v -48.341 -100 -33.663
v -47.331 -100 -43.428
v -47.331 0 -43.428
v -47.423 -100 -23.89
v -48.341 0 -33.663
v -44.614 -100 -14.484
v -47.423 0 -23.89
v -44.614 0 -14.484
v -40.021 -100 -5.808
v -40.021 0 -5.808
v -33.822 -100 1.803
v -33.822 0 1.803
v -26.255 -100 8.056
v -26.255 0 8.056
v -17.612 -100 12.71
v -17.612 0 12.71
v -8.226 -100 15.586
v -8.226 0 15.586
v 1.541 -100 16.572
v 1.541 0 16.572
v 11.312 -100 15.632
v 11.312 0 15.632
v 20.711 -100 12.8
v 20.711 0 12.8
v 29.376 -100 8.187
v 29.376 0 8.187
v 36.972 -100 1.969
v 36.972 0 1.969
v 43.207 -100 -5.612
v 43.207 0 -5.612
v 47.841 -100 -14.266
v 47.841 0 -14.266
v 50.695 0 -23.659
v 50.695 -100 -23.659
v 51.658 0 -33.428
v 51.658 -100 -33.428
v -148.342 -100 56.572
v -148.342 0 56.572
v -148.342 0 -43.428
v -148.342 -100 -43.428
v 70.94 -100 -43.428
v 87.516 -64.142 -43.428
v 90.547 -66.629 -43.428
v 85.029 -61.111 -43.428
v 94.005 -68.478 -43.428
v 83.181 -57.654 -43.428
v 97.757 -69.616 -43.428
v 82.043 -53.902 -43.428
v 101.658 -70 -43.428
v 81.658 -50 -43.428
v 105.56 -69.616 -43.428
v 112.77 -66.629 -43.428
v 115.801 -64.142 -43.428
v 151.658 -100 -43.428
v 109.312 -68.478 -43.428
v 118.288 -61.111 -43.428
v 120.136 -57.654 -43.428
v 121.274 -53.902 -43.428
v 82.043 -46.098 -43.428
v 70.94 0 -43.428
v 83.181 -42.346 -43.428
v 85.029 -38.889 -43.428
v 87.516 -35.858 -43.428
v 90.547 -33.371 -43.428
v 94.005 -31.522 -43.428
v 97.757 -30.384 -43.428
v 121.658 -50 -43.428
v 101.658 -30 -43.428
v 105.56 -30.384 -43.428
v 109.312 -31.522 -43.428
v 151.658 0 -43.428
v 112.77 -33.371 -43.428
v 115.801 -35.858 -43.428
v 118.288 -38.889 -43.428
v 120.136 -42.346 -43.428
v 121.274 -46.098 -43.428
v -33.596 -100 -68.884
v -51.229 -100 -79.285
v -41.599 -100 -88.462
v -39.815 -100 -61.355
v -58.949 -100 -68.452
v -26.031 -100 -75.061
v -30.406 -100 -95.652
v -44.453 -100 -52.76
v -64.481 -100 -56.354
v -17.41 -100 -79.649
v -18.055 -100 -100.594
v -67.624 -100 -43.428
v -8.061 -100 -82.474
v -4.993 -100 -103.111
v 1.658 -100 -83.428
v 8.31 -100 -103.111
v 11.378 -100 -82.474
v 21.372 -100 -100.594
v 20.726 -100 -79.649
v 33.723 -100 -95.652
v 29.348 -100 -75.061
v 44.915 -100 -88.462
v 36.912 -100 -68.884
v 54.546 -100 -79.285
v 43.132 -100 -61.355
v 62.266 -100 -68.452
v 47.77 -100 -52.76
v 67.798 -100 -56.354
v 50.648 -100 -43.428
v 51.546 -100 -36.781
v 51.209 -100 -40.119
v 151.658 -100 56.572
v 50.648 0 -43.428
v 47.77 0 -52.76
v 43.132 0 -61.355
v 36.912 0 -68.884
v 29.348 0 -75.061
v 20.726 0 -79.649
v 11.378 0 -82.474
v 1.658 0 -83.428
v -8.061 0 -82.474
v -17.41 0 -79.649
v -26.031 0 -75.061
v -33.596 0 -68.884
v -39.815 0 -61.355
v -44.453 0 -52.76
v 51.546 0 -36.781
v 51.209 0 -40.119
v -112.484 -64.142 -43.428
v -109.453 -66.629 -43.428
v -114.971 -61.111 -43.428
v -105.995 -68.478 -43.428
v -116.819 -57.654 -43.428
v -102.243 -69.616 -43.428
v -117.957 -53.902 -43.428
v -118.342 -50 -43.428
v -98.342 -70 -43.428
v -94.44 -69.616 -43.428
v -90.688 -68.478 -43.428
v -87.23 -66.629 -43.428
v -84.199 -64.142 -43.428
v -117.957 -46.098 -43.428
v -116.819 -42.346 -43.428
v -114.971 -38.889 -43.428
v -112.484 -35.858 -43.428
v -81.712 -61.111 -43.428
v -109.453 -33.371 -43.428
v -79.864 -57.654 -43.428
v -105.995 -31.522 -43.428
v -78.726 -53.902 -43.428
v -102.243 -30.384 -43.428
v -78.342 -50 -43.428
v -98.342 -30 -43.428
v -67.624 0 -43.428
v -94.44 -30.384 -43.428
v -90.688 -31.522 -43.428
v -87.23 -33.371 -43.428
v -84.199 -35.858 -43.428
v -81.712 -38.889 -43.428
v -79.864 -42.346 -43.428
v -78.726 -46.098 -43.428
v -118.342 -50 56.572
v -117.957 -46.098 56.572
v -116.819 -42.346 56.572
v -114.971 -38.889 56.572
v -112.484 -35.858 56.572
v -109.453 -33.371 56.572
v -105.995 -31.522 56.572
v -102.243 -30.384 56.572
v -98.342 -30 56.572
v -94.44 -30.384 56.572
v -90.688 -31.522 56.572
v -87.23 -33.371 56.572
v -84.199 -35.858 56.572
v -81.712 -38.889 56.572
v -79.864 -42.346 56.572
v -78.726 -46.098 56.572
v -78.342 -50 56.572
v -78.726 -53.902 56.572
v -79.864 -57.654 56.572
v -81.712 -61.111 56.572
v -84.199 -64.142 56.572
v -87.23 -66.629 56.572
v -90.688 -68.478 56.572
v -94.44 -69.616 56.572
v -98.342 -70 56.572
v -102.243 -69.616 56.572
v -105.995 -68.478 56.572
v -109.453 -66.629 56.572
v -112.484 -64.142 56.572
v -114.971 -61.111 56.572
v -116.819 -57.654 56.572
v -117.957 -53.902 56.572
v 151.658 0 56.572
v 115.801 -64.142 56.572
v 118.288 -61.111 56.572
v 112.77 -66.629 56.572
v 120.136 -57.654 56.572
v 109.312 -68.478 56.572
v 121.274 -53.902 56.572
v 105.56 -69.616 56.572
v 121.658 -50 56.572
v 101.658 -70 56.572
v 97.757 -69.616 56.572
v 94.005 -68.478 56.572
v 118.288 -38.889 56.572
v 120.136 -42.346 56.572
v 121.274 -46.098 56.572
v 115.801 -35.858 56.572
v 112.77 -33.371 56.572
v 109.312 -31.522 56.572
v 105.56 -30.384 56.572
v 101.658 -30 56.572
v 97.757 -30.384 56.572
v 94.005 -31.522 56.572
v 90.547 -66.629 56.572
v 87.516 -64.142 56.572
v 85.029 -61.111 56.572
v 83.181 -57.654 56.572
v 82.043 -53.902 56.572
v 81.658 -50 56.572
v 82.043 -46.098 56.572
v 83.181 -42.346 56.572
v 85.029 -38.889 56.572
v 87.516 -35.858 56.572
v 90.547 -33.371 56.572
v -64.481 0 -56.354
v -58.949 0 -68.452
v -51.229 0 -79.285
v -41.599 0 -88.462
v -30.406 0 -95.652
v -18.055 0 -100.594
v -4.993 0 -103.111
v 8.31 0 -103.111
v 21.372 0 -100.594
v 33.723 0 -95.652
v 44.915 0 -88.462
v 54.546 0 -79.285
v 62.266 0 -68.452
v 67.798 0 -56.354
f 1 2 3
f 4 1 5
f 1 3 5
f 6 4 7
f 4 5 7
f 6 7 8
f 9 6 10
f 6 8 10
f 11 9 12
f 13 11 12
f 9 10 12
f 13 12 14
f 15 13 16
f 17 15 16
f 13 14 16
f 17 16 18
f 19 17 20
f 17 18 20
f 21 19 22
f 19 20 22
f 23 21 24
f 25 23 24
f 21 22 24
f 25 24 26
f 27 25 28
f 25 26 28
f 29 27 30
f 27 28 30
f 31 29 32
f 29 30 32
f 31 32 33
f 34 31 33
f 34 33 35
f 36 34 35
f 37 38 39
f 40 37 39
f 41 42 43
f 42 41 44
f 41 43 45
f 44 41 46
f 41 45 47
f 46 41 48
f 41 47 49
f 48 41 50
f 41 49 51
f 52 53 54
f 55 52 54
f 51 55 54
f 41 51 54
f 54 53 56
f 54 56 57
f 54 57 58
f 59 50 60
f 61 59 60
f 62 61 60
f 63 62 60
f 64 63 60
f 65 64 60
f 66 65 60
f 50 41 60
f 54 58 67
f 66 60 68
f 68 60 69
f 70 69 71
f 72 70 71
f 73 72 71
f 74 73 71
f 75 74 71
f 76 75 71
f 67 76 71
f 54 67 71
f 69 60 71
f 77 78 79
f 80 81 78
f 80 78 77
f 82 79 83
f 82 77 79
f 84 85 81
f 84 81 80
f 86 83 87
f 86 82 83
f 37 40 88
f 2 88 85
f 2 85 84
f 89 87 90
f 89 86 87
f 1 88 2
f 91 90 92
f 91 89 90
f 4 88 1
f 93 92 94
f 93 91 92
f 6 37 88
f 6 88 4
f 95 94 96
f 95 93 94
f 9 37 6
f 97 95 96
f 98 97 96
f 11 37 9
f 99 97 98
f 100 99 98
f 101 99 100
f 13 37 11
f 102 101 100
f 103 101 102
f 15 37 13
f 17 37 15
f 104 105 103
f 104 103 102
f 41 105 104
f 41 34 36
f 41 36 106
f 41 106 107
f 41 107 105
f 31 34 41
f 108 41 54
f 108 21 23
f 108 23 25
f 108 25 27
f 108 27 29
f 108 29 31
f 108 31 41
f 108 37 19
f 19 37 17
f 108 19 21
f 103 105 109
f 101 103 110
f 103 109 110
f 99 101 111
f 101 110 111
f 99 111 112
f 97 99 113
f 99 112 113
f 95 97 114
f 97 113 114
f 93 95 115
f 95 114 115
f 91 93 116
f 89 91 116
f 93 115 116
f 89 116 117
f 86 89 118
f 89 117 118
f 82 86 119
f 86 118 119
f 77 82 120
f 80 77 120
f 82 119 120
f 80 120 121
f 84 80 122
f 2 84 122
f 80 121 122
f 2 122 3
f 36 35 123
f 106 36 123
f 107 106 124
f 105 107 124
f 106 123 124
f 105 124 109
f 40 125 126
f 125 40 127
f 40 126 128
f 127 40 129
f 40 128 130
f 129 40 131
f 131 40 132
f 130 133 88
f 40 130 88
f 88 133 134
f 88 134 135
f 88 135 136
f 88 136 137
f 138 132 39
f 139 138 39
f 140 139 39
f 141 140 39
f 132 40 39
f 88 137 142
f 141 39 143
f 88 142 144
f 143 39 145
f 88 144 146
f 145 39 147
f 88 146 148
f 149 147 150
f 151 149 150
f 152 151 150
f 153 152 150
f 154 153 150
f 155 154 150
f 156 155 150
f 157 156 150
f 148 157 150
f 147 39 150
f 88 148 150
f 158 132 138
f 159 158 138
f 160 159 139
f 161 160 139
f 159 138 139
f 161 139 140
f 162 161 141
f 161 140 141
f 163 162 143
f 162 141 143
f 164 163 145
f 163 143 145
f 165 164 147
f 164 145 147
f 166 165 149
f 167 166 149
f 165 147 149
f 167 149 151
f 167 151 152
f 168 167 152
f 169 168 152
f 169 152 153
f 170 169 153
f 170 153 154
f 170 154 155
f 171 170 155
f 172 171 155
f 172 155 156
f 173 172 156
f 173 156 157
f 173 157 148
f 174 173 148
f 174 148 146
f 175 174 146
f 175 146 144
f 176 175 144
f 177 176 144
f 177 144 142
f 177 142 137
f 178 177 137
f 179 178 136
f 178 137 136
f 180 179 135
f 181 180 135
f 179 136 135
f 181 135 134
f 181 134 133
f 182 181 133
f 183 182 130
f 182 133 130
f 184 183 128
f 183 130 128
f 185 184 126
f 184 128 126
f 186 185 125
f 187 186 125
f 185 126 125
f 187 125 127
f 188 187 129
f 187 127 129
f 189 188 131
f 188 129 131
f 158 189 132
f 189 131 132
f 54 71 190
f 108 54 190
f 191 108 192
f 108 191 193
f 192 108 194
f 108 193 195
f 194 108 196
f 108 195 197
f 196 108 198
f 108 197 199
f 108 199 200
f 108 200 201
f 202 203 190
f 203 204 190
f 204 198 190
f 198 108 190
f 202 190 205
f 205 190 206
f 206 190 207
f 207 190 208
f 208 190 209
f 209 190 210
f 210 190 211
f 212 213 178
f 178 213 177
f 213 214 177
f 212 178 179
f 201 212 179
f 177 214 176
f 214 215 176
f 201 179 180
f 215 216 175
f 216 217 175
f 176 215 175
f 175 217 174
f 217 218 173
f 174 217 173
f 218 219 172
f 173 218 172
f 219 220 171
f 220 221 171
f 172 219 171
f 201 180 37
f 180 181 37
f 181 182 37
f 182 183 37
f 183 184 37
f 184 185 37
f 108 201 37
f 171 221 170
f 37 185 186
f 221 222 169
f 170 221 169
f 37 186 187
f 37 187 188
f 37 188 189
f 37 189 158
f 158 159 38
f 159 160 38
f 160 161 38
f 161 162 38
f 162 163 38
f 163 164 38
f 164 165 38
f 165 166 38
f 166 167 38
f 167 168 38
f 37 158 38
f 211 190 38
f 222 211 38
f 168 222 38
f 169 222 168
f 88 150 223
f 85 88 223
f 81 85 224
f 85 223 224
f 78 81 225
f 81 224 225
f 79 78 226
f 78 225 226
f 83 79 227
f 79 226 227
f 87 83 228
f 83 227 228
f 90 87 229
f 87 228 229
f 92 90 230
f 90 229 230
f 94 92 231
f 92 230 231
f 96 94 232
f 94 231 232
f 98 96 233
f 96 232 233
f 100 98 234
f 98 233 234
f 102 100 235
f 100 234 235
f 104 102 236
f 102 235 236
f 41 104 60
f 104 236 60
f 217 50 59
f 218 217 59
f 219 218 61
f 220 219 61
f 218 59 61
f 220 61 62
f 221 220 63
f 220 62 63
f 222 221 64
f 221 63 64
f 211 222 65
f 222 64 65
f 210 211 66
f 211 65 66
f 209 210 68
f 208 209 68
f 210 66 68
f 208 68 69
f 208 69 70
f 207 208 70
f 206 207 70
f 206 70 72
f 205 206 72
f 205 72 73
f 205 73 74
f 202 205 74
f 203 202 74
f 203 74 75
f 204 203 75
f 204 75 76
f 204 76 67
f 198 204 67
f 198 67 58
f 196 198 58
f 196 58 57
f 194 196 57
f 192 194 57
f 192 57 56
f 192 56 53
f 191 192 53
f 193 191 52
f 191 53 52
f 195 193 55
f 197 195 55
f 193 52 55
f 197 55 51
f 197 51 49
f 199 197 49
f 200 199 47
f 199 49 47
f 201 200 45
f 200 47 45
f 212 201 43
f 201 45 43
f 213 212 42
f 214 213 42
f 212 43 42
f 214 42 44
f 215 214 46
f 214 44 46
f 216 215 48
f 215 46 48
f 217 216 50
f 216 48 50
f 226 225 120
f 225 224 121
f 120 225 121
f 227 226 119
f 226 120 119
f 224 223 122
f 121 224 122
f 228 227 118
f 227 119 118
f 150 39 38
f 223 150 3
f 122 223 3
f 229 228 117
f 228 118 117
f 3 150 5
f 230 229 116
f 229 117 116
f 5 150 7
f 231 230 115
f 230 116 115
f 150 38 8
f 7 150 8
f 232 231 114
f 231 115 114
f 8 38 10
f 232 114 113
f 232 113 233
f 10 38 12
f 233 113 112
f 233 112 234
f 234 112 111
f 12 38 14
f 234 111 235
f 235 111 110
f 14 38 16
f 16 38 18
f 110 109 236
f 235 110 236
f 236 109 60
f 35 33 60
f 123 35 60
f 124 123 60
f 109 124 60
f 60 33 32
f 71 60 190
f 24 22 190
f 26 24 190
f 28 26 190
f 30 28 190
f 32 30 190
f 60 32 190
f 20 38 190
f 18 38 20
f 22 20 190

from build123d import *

# Parameters (mm, degrees)
F1_DEPTH = 100
F3_D     = 40


with BuildPart() as f1:
    # F0 (on Front) → F1 (new body)
    with BuildSketch(Plane.XZ):
        with BuildLine():
            Line((151.65843, 56.57242), (-148.34157, 56.57242))
            Line((-148.34157, 56.57242), (-148.34157, -43.42758))
            Line((-148.34157, -43.42758), (-67.623602, -43.42758))
            ThreePointArc((-67.623602, -43.42758), (1.65843, -103.42758), (70.940463, -43.42758))
            Line((70.940463, -43.42758), (151.65843, -43.42758))
            Line((151.65843, -43.42758), (151.65843, 56.57242))
        make_face()
        with BuildLine():
            ThreePointArc((-47.331365, -43.42758), (-3.367018, 16.319228), (51.65843, -33.42758))
            ThreePointArc((51.65843, -33.42758), (51.405238, -38.453028), (50.648225, -43.42758))
            ThreePointArc((50.648225, -43.42758), (1.65843, -83.42758), (-47.331365, -43.42758))
        make_face(mode=Mode.SUBTRACT)
    extrude(amount=F1_DEPTH)

    # F3 (through all)
    with Locations(Plane.XY.offset(56.57242)):
        with Locations((-98.34157, -50), (101.65843, -50)):
            Hole(F3_D / 2)


solid = f1.part
